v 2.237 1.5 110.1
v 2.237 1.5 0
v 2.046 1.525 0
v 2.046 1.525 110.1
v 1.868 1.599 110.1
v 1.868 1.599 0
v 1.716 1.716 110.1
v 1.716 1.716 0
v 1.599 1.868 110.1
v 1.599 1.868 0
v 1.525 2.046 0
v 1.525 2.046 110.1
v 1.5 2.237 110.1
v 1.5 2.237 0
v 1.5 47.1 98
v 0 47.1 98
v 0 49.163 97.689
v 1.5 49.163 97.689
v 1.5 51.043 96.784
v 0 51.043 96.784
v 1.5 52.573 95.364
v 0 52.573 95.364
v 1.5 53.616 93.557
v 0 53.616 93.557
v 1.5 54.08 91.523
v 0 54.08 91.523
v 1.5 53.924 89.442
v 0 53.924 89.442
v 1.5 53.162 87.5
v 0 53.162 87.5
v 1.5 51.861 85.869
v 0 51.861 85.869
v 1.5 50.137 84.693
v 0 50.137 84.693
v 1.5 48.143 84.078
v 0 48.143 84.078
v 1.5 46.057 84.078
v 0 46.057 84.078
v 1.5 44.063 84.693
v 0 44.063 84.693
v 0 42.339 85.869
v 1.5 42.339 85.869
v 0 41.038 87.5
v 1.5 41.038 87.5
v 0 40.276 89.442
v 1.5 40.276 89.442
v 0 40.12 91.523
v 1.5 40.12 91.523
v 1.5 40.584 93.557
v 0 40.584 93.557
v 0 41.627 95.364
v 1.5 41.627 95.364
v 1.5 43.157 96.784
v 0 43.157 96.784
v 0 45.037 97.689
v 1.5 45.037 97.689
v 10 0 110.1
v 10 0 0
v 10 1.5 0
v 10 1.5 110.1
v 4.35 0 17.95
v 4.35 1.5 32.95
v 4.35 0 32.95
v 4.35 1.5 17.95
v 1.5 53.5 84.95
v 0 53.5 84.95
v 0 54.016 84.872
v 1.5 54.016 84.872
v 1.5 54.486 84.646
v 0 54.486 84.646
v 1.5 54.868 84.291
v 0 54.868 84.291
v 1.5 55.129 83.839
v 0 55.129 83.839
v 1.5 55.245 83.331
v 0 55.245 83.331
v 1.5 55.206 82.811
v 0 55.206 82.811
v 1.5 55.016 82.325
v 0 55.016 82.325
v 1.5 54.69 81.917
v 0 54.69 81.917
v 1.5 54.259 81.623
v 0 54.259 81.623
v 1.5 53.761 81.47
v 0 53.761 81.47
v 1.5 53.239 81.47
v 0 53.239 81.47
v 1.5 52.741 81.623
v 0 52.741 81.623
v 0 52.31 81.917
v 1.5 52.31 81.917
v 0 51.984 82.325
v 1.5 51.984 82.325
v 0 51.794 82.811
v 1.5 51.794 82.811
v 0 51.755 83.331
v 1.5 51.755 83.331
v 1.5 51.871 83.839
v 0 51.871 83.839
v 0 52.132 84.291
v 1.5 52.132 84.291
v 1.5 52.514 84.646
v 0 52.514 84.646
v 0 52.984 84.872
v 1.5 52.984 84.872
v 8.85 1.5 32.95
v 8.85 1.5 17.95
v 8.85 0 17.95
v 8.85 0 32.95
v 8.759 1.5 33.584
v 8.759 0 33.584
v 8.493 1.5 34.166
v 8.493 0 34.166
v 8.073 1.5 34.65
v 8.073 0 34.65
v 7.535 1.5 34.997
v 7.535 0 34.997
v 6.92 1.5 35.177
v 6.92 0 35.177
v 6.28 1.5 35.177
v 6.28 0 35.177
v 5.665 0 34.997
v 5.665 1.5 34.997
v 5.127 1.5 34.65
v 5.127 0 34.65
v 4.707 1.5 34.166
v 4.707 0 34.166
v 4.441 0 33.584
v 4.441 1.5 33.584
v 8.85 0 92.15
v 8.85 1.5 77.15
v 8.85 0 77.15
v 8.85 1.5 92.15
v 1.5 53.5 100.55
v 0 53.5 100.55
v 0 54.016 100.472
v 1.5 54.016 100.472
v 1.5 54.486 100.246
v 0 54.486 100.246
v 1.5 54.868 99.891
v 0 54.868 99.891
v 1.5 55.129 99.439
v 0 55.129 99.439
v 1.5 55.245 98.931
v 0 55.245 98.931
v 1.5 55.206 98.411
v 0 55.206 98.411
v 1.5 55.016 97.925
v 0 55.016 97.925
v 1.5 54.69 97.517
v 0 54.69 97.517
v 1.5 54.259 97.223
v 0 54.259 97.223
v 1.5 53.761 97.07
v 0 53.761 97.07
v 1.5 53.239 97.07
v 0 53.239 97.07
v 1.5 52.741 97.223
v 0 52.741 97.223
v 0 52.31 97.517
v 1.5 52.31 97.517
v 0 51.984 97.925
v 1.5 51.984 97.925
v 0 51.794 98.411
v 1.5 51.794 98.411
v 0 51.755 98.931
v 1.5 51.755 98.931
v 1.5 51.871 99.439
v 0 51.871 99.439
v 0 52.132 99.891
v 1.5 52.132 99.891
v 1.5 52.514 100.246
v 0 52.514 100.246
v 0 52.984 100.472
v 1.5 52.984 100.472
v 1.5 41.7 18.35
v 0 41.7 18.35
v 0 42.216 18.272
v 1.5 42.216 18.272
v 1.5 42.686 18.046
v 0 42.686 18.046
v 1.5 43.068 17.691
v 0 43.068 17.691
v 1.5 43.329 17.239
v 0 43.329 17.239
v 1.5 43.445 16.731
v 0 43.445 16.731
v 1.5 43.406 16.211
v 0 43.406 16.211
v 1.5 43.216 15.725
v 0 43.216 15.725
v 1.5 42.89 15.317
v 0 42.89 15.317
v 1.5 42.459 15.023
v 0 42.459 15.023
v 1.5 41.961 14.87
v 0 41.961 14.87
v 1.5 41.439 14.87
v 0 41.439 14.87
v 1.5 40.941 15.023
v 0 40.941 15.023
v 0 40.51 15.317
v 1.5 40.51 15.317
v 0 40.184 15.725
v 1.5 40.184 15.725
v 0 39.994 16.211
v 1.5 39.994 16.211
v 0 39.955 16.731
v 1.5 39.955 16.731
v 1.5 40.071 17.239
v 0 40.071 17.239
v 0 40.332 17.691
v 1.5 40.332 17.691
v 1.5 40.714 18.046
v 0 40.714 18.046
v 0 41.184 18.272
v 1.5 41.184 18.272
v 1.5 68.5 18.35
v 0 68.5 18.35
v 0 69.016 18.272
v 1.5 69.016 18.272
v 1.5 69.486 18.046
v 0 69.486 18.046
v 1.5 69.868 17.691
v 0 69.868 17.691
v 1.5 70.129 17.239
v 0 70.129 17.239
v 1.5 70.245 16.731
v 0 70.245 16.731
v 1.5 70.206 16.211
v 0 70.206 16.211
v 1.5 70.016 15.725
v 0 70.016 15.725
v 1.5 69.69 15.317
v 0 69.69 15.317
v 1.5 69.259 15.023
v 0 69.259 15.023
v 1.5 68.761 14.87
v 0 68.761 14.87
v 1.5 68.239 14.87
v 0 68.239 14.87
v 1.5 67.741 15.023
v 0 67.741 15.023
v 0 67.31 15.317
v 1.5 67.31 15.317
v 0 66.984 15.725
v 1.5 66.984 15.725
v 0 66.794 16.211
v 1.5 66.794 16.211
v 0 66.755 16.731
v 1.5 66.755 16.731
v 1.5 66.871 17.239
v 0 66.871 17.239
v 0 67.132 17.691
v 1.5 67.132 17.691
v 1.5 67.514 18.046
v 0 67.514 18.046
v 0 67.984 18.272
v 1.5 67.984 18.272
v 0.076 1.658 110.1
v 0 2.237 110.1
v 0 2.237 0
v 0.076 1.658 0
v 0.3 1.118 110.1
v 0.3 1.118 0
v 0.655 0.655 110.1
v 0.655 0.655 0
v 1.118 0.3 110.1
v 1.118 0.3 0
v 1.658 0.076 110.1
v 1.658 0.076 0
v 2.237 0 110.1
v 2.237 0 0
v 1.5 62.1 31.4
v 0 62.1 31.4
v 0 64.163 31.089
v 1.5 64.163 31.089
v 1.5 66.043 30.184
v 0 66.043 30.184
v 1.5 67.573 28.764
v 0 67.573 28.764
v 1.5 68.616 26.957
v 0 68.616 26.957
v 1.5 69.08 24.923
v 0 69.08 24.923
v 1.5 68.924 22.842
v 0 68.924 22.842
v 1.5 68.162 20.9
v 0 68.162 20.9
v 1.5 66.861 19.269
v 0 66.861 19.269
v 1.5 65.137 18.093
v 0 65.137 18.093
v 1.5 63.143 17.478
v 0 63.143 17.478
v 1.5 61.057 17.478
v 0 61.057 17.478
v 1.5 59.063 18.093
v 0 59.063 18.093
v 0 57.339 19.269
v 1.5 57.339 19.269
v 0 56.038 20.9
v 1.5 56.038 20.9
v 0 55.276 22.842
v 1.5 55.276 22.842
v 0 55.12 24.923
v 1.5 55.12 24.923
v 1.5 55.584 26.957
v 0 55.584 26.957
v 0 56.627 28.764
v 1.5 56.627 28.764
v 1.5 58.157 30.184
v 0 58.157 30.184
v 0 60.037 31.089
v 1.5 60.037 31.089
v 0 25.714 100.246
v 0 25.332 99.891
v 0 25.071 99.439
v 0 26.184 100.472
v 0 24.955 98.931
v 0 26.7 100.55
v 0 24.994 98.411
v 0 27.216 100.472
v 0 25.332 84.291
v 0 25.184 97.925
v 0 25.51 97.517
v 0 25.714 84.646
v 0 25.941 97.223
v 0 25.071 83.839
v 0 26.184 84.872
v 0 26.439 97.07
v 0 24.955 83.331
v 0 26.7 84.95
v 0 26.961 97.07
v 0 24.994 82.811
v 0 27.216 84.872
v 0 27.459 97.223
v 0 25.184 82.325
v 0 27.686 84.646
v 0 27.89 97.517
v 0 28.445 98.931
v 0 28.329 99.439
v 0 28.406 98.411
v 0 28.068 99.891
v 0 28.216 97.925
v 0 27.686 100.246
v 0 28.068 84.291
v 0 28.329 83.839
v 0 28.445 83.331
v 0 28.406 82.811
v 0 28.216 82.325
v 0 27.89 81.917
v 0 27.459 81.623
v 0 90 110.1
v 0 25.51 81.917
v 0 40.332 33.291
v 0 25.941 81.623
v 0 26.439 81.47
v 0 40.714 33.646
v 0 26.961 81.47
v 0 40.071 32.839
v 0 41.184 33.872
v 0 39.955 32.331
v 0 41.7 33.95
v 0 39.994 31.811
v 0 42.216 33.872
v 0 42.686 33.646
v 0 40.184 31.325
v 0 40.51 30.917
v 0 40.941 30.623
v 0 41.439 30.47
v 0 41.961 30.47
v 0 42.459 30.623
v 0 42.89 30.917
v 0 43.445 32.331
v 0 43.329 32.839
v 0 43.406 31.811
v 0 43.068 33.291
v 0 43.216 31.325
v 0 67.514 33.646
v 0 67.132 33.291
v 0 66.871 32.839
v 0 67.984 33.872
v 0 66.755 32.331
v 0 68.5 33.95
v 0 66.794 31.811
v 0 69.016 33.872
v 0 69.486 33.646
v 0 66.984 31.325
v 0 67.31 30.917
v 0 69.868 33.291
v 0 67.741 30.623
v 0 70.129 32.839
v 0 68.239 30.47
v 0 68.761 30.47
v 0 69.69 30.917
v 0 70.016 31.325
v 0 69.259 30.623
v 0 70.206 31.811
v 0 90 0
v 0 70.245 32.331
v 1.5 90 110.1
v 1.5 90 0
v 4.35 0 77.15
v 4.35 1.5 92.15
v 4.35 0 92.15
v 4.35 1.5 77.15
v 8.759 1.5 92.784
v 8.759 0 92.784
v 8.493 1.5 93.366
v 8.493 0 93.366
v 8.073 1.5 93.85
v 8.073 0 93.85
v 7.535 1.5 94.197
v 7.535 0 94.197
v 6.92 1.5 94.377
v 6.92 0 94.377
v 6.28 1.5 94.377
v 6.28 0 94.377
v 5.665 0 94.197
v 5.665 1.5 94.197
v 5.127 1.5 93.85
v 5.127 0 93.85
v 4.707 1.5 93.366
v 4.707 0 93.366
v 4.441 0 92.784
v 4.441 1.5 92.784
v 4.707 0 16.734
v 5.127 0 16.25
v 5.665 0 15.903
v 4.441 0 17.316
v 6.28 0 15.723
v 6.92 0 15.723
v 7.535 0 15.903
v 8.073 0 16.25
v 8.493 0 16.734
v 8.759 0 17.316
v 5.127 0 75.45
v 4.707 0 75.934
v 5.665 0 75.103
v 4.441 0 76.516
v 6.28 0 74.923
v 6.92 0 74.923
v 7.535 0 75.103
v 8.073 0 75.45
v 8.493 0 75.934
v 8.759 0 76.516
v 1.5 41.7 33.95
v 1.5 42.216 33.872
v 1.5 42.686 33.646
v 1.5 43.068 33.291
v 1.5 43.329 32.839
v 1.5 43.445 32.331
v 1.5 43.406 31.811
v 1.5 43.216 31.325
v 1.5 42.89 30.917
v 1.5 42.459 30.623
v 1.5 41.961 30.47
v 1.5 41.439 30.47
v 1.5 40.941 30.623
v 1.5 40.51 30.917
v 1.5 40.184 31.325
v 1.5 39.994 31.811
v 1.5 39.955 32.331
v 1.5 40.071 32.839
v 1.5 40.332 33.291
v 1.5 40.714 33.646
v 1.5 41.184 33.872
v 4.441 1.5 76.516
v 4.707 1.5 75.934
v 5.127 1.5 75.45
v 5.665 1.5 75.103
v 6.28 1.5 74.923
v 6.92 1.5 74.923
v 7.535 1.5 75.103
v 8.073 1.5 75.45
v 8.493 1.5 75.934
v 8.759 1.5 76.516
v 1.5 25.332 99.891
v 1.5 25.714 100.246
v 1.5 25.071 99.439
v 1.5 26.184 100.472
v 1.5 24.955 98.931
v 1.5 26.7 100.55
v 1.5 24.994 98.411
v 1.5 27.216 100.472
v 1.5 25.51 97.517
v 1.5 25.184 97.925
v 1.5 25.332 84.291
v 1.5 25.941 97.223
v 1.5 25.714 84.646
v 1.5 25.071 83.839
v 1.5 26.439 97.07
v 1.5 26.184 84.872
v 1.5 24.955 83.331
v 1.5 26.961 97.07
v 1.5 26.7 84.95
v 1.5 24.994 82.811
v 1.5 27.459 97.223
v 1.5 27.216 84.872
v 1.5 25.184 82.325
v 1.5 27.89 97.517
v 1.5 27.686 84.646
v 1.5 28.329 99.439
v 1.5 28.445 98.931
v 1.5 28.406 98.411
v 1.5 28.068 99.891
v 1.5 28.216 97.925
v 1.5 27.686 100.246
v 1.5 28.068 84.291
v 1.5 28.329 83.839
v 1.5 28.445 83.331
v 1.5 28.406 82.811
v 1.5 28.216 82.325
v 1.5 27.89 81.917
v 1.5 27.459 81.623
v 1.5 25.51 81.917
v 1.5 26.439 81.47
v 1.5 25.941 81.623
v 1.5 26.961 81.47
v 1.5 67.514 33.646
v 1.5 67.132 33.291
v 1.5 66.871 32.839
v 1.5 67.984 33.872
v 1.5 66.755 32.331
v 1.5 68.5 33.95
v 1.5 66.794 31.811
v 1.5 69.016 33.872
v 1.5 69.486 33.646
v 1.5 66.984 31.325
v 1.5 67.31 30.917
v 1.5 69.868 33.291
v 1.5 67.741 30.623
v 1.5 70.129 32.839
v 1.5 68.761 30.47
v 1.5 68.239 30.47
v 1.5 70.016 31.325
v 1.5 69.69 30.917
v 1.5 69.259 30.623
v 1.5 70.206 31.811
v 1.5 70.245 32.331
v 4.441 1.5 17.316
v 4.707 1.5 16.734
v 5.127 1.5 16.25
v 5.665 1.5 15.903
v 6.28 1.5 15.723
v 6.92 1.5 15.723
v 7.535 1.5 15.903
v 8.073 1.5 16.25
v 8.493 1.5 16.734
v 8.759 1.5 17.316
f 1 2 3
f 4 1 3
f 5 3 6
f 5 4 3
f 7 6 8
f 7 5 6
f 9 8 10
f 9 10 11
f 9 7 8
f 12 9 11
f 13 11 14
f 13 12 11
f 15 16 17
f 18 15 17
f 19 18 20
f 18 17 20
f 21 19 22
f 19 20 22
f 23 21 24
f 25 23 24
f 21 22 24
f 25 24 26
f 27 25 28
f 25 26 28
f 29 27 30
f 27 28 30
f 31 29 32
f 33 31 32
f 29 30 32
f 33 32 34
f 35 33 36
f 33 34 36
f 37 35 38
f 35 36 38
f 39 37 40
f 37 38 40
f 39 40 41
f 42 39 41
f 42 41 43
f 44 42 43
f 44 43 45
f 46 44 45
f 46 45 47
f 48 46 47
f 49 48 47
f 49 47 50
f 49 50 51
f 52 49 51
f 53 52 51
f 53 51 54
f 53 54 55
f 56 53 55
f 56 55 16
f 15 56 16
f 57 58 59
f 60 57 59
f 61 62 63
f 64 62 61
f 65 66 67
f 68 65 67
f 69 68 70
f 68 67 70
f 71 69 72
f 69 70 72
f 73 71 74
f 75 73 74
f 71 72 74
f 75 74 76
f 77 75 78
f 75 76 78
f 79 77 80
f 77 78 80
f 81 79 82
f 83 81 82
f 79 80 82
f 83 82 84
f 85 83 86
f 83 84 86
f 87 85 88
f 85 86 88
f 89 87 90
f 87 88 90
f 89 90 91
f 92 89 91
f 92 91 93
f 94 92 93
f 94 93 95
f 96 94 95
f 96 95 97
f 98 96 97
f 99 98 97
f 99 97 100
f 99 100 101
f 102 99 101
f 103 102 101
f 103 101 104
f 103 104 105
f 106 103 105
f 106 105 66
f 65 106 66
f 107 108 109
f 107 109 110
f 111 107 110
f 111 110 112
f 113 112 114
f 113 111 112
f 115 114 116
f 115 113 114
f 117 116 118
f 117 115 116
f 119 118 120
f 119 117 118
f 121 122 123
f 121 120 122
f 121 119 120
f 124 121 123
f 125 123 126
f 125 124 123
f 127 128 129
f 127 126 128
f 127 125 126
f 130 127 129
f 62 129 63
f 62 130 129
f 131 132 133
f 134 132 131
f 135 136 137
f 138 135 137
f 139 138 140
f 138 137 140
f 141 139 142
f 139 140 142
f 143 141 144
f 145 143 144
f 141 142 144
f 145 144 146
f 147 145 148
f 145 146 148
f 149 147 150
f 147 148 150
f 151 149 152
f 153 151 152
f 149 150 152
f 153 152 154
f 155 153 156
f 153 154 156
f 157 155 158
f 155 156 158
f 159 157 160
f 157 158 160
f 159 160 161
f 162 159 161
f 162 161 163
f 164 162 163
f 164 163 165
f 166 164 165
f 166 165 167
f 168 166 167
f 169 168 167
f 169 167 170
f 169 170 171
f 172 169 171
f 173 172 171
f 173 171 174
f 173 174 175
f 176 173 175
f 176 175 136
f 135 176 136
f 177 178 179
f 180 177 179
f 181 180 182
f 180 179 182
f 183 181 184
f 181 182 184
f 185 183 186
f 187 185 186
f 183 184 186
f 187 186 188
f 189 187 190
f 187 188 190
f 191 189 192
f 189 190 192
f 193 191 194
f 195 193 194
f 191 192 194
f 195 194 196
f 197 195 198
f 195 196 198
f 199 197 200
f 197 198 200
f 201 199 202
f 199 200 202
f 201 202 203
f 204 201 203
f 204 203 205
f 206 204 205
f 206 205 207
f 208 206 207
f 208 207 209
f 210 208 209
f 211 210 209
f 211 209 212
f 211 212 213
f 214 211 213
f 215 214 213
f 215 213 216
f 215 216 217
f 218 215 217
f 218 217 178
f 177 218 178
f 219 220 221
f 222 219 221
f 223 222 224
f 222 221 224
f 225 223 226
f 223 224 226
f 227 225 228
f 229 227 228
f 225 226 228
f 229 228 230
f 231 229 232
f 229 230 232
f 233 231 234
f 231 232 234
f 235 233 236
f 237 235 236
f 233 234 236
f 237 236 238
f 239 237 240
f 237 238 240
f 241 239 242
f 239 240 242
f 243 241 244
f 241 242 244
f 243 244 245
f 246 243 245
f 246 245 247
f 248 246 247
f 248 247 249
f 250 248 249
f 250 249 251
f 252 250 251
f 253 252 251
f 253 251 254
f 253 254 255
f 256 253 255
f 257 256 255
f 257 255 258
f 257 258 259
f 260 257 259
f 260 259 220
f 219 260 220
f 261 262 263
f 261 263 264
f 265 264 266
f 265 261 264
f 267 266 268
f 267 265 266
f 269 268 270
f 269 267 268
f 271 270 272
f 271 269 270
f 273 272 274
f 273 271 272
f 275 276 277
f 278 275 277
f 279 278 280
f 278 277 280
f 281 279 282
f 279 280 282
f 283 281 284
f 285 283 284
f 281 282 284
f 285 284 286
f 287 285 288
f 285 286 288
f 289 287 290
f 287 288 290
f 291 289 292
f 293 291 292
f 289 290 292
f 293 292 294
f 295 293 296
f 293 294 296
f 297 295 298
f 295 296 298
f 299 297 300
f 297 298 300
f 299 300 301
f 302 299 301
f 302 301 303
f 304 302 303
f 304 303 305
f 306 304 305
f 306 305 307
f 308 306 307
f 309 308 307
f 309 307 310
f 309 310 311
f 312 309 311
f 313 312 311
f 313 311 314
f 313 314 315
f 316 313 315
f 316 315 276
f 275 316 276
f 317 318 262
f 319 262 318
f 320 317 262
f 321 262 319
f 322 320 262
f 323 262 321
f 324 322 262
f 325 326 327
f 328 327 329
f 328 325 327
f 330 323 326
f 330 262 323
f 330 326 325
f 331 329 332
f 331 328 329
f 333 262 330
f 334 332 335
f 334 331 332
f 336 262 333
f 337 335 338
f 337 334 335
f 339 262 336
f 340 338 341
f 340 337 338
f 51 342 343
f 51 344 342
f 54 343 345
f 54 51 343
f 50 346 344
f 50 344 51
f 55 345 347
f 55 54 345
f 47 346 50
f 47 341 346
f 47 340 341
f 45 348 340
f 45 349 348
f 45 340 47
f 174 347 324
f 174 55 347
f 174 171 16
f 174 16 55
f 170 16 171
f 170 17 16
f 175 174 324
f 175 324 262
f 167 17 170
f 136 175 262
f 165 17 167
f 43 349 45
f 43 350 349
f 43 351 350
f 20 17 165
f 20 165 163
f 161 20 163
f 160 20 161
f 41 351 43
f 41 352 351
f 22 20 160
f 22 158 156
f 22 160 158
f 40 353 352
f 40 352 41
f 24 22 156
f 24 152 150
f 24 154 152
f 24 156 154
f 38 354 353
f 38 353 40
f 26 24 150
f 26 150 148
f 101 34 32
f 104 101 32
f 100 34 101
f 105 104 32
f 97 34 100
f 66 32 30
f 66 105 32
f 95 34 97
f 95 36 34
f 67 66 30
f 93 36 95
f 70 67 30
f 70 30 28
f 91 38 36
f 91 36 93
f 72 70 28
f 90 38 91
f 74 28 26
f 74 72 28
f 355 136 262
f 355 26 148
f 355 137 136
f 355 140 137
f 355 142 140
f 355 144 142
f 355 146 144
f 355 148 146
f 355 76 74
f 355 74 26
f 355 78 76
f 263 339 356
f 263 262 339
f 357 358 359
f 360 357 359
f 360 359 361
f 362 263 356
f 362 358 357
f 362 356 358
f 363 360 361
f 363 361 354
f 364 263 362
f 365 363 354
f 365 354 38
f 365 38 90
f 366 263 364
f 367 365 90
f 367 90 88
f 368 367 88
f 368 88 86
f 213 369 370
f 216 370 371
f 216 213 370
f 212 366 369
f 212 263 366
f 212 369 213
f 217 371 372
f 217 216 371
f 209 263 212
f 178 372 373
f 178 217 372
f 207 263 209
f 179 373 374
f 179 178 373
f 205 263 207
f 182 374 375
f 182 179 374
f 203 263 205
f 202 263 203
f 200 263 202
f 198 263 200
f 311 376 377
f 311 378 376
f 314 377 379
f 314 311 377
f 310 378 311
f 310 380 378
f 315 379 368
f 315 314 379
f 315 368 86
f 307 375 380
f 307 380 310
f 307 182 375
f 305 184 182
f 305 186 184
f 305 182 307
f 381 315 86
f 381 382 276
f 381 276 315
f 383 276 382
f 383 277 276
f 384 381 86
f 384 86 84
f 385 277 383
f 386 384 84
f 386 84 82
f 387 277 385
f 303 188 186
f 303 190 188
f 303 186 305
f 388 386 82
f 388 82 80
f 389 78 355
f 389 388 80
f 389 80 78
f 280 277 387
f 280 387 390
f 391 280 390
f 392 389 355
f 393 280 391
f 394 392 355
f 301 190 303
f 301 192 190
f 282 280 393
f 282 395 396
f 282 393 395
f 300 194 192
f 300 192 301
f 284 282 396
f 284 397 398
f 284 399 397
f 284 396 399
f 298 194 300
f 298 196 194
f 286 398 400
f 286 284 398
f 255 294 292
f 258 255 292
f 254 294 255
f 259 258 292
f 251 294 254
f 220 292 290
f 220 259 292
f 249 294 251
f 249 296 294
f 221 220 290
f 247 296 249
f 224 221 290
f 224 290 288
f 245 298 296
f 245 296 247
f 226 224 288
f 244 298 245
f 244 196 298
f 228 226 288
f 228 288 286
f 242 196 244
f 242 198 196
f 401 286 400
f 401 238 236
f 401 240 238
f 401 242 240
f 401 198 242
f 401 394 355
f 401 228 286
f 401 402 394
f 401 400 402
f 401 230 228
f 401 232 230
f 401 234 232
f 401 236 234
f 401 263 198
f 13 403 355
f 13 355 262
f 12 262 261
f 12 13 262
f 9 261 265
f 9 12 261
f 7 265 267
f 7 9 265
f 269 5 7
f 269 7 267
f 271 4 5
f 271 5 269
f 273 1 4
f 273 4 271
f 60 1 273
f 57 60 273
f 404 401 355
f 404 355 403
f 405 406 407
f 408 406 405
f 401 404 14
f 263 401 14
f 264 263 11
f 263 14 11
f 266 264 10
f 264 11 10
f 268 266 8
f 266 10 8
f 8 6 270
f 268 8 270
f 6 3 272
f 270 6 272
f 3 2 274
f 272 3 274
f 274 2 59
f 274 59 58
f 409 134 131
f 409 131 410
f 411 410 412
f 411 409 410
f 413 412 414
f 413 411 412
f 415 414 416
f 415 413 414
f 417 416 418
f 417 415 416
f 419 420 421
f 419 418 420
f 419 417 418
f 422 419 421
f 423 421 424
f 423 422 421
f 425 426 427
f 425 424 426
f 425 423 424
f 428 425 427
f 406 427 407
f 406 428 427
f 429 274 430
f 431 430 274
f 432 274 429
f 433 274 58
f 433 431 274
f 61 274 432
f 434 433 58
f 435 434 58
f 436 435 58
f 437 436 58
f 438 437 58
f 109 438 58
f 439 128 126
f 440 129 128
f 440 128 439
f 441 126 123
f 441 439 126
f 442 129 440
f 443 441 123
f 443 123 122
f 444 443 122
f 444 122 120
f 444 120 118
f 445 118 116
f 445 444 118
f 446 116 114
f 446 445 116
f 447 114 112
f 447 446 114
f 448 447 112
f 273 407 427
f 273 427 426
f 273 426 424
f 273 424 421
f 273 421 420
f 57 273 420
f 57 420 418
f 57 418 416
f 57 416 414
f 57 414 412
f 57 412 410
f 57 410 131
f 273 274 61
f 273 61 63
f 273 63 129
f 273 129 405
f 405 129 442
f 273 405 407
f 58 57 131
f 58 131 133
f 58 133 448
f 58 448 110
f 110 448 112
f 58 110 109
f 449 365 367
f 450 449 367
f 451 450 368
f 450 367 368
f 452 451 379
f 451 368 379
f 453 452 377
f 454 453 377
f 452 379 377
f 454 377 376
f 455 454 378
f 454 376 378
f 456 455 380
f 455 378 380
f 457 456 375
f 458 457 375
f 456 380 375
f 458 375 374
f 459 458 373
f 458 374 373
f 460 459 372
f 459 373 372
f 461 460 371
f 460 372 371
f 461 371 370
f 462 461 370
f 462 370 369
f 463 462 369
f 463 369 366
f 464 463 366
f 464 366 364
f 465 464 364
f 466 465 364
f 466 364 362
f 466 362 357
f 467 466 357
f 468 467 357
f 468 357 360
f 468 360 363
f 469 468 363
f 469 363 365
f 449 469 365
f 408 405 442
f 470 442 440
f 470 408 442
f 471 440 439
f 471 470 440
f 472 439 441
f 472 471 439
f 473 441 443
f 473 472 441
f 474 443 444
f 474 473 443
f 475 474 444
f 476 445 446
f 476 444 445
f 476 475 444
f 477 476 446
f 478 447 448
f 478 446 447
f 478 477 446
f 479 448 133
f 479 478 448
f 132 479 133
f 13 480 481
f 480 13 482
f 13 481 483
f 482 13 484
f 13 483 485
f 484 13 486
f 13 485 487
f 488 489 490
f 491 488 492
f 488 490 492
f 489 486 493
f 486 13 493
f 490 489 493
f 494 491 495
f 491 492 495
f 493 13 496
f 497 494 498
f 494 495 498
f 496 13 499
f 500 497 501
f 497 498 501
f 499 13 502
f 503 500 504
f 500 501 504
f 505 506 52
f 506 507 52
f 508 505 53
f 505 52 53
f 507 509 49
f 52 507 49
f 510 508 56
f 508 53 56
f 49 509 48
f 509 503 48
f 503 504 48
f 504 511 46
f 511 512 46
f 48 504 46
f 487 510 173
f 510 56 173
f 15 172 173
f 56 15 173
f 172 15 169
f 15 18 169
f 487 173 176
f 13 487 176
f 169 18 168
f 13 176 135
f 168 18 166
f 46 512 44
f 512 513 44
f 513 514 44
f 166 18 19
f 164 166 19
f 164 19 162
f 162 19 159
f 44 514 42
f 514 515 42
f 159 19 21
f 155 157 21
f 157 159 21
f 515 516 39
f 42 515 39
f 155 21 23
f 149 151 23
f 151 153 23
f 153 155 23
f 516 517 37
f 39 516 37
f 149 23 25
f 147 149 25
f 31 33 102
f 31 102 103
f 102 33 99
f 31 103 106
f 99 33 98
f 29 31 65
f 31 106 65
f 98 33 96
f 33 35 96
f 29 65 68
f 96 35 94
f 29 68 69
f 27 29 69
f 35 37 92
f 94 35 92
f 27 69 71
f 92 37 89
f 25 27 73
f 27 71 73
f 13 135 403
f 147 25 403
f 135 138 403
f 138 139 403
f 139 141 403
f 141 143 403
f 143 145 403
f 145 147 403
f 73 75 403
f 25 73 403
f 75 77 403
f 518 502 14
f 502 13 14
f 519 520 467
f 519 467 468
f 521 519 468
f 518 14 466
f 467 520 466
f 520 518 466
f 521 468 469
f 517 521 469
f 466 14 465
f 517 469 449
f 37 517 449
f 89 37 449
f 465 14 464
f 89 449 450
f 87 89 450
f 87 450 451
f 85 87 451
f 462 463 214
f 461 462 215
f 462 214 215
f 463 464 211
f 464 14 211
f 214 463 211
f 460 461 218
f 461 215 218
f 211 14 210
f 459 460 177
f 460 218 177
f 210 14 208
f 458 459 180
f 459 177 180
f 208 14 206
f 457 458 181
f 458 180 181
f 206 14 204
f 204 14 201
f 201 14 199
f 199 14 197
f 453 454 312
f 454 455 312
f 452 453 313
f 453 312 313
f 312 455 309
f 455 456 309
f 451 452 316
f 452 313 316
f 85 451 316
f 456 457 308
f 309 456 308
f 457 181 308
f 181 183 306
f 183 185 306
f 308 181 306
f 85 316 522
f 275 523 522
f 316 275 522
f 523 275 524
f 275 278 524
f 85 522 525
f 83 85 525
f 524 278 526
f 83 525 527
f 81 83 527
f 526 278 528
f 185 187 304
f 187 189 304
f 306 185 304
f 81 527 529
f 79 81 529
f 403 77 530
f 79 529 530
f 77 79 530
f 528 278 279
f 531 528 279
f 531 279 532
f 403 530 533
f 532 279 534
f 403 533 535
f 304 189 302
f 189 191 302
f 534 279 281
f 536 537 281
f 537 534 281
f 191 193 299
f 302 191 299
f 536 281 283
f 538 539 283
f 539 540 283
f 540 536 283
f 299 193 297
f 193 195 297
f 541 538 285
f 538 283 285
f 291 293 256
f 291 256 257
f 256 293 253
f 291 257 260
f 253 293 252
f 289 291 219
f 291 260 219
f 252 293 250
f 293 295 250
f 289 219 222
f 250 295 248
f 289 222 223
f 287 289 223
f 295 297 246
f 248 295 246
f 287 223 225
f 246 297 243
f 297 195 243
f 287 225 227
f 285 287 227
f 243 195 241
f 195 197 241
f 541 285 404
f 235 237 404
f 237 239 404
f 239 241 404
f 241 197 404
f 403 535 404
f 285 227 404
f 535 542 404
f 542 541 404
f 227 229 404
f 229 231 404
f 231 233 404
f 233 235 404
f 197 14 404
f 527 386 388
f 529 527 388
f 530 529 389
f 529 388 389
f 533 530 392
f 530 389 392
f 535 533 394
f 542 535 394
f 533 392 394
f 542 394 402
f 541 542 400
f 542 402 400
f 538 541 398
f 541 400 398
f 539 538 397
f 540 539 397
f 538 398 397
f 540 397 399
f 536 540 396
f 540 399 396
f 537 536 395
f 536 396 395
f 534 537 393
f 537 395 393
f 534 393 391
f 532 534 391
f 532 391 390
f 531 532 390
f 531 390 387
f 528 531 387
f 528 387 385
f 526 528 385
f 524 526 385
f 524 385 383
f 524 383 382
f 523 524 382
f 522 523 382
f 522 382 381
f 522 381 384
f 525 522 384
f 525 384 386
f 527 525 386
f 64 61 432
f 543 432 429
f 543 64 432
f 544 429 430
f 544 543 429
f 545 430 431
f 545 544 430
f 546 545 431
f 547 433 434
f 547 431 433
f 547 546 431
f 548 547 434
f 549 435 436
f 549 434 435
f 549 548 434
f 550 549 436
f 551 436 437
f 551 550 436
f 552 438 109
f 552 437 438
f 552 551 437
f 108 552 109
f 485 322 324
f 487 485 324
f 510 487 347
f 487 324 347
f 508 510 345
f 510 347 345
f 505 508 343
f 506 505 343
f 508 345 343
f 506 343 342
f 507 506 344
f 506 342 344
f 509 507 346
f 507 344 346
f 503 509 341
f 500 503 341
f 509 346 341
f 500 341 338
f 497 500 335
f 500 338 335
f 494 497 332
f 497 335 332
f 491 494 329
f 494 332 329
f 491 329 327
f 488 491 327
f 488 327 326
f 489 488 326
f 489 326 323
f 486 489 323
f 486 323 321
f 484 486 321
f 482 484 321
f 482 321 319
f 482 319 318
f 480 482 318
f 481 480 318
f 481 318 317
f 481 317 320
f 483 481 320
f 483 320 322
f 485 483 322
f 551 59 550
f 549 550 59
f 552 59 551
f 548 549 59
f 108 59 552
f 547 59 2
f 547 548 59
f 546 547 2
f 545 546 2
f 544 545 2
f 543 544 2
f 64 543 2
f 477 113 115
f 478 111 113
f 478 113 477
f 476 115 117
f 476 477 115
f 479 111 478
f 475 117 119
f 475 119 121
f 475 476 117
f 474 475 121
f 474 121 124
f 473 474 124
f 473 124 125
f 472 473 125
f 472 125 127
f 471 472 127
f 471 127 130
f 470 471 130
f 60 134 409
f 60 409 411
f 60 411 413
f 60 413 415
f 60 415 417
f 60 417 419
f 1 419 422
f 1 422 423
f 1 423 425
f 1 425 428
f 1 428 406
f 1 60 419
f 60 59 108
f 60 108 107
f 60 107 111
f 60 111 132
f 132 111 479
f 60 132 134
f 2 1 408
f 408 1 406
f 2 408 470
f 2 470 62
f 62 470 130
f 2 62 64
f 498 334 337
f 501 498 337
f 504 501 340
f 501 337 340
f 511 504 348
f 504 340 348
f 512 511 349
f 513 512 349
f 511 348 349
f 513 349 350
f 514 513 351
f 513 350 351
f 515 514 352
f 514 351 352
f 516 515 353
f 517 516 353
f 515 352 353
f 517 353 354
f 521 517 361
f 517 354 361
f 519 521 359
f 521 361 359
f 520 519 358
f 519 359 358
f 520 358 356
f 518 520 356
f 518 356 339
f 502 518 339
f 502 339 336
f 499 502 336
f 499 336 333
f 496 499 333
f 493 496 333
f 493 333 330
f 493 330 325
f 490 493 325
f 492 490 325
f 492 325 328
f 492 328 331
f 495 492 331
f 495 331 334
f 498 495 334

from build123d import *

# Parameters (mm, degrees)
SKETCH_1_W                       = 1.5
SKETCH_1_H                       = 90
SM_BASE_FLANGE_1_DEPTH           = 110.1
SKETCH_6_R                       = 7
SKETCH_6_R_2                     = 1.75
CUT_EXTRUDE_1_DEPTH              = 10
SM_EDGE_FLANGE_1_STRIP_W         = 7.4732
SM_EDGE_FLANGE_1_STRIP_H         = 1.5
SM_EDGE_FLANGE_1_STRIP_CUT_DEPTH = 110.1
SM_EDGE_FLANGE_1_DEPTH           = 110.1
CUT_EXTRUDE_2_DEPTH              = 10


# Sheet-metal steps are written as plain solids
with BuildPart() as part:
    # Sketch 1 → 基体-法兰1 (new body)
    with BuildSketch(Plane.XY):
        with Locations((0.75, 45)):
            Rectangle(SKETCH_1_W, SKETCH_1_H)
    extrude(amount=SM_BASE_FLANGE_1_DEPTH)

    # 草图6 → 切除-拉伸1 (cut)
    with BuildSketch(Plane.ZY):
        with Locations((24.4, 62.1)):
            Circle(SKETCH_6_R)
        with Locations((91, 47.1)):
            Circle(SKETCH_6_R)
        with Locations((16.6, 68.5)):
            Circle(SKETCH_6_R_2)
        with Locations((16.6, 41.7)):
            Circle(SKETCH_6_R_2)
        with Locations((32.2, 41.7)):
            Circle(SKETCH_6_R_2)
        with Locations((32.2, 68.5)):
            Circle(SKETCH_6_R_2)
        with Locations((83.2, 53.5)):
            Circle(SKETCH_6_R_2)
        with Locations((83.2, 26.7)):
            Circle(SKETCH_6_R_2)
        with Locations((98.8, 26.7)):
            Circle(SKETCH_6_R_2)
        with Locations((98.8, 53.5)):
            Circle(SKETCH_6_R_2)
    extrude(amount=-CUT_EXTRUDE_1_DEPTH, mode=Mode.SUBTRACT)

    # 边线-法兰1 strip (across the edge) → 边线-法兰1 strip cut (cut)
    with BuildSketch(Plane(origin=(1.5, 0, 110.1), x_dir=(0, 1, 0), z_dir=(0, 0, -1))):
        with Locations((-1.5, -0.75)):
            Rectangle(SM_EDGE_FLANGE_1_STRIP_W, SM_EDGE_FLANGE_1_STRIP_H)
    extrude(amount=SM_EDGE_FLANGE_1_STRIP_CUT_DEPTH, mode=Mode.SUBTRACT)

    # 边线-法兰1 section (across the edge) → 边线-法兰1 (add)
    with BuildSketch(Plane(origin=(1.5, 0, 110.1), x_dir=(0, 1, 0), z_dir=(0, 0, -1))):
        with BuildLine():
            Line((0, 0.7366), (0, 8.5))
            Line((0, 8.5), (1.5, 8.5))
            Line((1.5, 8.5), (1.5, 0.7366))
            ThreePointArc((1.5, 0.7366), (1.715745145, 0.215745145), (2.2366, 0))
            Line((2.2366, 0), (2.2366, -1.5))
            ThreePointArc((2.2366, -1.5), (0.655084973, -0.844915027), (0, 0.7366))
        make_face()
    extrude(amount=SM_EDGE_FLANGE_1_DEPTH)

    # 草图10 → 切除-拉伸2 (cut)
    with BuildSketch(Plane(origin=(0, 1.5, 0), x_dir=(1, 0, 0), z_dir=(0, 1, 0))):
        with BuildLine():
            Line((8.85, -17.95), (8.85, -32.95))
            ThreePointArc((8.85, -32.95), (6.6, -35.2), (4.35, -32.95))
            Line((4.35, -32.95), (4.35, -17.95))
            ThreePointArc((4.35, -17.95), (6.6, -15.700000154), (8.85, -17.95))
        make_face()
        with BuildLine():
            Line((4.35, -92.15), (4.35, -77.15))
            ThreePointArc((4.35, -77.15), (6.6, -74.899999913), (8.85, -77.15))
            Line((8.85, -77.15), (8.85, -92.15))
            ThreePointArc((8.85, -92.15), (6.6, -94.4), (4.35, -92.15))
        make_face()
    extrude(amount=-CUT_EXTRUDE_2_DEPTH, mode=Mode.SUBTRACT)


solid = part.part
